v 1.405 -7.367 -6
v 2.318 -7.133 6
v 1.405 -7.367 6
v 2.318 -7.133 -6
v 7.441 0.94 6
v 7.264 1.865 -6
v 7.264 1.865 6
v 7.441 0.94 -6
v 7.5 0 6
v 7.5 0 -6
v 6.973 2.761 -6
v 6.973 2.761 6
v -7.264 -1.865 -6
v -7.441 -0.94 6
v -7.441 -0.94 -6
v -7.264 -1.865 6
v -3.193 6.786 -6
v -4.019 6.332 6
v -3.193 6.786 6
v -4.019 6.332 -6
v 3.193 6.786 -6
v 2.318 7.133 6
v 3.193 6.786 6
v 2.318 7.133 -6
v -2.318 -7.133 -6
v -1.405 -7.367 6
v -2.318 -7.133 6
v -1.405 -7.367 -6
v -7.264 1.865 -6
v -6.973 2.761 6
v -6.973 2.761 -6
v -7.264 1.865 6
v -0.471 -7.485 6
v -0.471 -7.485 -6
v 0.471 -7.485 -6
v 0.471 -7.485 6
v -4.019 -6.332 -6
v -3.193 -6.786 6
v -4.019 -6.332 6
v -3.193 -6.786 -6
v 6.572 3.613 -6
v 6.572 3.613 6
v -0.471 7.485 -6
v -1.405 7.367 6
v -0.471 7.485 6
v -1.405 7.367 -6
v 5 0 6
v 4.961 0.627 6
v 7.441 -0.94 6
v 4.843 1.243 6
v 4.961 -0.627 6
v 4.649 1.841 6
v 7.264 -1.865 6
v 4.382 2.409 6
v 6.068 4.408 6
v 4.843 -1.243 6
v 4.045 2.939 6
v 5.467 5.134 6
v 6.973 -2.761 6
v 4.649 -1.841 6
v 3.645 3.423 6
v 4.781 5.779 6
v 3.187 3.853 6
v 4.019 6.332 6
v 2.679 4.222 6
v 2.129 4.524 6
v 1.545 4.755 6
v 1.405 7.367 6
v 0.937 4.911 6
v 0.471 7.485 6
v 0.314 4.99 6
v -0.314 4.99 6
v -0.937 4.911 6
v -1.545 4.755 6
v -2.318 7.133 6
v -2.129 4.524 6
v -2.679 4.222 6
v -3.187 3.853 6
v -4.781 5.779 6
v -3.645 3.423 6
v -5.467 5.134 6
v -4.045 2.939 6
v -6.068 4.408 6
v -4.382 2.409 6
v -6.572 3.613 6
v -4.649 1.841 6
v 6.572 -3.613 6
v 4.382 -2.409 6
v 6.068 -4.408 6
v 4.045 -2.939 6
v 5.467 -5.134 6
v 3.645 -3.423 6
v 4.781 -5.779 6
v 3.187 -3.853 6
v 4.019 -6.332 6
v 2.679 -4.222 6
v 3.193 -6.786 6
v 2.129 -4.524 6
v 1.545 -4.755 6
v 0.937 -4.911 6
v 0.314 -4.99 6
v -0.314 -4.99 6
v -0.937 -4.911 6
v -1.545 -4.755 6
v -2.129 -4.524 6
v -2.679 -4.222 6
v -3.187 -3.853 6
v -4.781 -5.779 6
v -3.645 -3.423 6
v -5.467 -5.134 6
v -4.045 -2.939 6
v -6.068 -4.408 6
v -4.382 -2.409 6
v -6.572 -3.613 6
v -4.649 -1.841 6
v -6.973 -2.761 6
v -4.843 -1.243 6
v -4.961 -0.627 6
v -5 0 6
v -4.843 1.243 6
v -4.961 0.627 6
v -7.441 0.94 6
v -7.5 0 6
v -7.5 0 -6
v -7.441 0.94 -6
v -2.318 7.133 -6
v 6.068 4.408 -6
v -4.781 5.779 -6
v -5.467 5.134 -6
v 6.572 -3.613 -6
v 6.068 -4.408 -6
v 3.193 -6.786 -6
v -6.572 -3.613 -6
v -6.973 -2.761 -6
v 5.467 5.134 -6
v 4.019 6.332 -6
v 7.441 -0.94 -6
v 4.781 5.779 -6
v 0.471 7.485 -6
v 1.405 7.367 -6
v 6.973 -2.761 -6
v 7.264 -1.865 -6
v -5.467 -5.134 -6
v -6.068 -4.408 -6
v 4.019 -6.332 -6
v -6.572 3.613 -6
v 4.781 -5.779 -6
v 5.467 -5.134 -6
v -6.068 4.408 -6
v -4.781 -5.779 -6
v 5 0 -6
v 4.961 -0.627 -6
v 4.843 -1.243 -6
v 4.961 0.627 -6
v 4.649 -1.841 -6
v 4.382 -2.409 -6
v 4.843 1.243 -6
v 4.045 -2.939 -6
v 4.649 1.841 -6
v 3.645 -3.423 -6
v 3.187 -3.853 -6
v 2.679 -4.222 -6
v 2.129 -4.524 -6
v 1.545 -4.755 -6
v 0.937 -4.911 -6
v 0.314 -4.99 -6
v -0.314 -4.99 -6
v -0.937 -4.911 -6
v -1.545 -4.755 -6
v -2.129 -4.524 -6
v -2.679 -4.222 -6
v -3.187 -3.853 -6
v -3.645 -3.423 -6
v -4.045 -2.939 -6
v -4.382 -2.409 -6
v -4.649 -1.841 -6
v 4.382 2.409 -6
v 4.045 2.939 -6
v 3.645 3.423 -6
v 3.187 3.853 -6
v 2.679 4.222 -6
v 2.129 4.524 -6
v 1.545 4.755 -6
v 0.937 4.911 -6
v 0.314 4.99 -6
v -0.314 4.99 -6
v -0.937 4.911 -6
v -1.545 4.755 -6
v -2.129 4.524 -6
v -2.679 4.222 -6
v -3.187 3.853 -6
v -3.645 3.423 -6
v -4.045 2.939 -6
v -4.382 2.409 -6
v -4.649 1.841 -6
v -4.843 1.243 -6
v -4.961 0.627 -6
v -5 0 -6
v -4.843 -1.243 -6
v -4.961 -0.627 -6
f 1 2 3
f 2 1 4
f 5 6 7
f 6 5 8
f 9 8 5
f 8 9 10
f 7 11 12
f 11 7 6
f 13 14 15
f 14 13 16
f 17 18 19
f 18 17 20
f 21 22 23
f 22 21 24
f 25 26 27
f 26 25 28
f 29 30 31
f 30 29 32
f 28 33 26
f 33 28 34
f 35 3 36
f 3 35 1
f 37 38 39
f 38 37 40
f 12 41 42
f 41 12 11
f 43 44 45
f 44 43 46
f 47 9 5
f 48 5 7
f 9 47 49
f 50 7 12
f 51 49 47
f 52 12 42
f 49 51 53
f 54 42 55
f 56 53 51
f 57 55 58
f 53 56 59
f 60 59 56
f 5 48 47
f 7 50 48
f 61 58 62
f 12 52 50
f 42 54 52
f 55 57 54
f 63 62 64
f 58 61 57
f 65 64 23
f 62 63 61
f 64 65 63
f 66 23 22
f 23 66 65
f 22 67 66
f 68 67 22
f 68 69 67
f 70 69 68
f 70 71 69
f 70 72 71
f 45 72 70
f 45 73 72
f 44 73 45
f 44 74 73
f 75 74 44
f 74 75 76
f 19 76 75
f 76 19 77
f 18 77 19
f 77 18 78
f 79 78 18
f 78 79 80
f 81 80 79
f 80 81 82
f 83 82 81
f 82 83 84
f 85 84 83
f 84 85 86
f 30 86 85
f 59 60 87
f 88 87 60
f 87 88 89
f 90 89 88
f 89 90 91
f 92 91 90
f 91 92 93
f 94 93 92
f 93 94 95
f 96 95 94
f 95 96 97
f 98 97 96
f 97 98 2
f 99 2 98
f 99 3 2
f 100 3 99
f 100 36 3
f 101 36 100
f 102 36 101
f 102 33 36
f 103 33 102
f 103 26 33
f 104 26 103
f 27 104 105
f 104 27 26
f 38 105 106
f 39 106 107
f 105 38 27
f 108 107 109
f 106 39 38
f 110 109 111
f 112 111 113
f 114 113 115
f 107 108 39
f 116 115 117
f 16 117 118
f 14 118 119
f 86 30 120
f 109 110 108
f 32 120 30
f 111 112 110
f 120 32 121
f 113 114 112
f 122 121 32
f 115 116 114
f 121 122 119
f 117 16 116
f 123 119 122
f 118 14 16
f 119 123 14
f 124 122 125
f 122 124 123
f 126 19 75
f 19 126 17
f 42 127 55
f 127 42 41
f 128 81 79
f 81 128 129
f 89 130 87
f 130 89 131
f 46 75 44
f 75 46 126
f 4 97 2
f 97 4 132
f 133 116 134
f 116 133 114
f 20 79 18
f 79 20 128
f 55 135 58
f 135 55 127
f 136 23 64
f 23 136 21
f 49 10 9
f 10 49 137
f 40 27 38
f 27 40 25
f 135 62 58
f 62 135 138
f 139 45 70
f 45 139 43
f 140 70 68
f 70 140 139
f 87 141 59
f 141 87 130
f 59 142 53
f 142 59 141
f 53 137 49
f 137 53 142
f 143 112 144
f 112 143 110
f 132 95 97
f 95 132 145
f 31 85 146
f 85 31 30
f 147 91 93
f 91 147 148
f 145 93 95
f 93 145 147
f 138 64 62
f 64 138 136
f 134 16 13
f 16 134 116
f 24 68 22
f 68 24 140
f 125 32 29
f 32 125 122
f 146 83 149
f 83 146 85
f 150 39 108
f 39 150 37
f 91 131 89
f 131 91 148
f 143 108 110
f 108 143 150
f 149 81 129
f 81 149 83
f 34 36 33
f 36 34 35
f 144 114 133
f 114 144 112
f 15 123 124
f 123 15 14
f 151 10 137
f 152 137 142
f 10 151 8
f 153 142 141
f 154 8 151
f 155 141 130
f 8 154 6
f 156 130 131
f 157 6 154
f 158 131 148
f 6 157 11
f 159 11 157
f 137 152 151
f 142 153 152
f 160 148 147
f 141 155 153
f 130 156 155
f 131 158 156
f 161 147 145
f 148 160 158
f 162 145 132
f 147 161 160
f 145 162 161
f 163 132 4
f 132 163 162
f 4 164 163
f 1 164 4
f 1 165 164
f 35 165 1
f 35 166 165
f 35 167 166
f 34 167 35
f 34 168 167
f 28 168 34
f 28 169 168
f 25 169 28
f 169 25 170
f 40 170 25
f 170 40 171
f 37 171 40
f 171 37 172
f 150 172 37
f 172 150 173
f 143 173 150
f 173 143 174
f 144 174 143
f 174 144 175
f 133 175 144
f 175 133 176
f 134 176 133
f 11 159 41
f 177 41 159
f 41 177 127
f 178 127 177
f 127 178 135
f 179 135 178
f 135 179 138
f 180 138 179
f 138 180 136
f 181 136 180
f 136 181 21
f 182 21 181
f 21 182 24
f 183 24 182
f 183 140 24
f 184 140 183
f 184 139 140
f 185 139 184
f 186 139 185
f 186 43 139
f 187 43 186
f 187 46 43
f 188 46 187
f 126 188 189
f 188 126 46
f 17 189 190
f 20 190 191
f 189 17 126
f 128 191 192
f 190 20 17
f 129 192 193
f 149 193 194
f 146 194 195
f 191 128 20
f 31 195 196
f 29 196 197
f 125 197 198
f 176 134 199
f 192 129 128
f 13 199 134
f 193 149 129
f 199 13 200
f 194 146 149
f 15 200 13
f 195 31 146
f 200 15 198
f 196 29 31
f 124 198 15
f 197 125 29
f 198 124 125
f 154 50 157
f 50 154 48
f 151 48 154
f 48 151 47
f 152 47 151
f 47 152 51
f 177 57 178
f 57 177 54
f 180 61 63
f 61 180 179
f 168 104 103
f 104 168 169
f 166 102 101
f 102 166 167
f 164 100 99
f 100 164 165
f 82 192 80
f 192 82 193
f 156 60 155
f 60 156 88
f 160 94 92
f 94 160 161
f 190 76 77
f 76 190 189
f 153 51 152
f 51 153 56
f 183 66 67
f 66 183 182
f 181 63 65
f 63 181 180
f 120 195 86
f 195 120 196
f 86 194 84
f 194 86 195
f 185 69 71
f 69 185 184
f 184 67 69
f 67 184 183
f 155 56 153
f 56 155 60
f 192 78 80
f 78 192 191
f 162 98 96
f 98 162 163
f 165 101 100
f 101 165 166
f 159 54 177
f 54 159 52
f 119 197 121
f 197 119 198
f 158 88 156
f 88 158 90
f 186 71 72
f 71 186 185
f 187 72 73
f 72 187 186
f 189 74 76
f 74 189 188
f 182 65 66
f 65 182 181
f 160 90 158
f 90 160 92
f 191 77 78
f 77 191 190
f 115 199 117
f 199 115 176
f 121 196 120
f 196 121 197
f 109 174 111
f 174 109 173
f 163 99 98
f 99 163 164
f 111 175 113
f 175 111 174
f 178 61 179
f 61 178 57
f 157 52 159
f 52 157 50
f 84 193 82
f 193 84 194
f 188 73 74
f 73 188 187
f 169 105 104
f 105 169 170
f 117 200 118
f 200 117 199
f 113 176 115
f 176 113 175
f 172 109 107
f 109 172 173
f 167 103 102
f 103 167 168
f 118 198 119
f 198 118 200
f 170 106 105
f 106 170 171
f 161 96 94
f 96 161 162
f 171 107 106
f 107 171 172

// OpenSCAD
$fn = 50;


difference() {
	union() {
		translate(v = [0, 0, -6.0000000000]) {
			cylinder(h = 12, r = 7.5000000000);
		}
	}
	union() {
		translate(v = [0, 0, -100.0000000000]) {
			cylinder(h = 200, r = 5.0000000000);
		}
	}
}
